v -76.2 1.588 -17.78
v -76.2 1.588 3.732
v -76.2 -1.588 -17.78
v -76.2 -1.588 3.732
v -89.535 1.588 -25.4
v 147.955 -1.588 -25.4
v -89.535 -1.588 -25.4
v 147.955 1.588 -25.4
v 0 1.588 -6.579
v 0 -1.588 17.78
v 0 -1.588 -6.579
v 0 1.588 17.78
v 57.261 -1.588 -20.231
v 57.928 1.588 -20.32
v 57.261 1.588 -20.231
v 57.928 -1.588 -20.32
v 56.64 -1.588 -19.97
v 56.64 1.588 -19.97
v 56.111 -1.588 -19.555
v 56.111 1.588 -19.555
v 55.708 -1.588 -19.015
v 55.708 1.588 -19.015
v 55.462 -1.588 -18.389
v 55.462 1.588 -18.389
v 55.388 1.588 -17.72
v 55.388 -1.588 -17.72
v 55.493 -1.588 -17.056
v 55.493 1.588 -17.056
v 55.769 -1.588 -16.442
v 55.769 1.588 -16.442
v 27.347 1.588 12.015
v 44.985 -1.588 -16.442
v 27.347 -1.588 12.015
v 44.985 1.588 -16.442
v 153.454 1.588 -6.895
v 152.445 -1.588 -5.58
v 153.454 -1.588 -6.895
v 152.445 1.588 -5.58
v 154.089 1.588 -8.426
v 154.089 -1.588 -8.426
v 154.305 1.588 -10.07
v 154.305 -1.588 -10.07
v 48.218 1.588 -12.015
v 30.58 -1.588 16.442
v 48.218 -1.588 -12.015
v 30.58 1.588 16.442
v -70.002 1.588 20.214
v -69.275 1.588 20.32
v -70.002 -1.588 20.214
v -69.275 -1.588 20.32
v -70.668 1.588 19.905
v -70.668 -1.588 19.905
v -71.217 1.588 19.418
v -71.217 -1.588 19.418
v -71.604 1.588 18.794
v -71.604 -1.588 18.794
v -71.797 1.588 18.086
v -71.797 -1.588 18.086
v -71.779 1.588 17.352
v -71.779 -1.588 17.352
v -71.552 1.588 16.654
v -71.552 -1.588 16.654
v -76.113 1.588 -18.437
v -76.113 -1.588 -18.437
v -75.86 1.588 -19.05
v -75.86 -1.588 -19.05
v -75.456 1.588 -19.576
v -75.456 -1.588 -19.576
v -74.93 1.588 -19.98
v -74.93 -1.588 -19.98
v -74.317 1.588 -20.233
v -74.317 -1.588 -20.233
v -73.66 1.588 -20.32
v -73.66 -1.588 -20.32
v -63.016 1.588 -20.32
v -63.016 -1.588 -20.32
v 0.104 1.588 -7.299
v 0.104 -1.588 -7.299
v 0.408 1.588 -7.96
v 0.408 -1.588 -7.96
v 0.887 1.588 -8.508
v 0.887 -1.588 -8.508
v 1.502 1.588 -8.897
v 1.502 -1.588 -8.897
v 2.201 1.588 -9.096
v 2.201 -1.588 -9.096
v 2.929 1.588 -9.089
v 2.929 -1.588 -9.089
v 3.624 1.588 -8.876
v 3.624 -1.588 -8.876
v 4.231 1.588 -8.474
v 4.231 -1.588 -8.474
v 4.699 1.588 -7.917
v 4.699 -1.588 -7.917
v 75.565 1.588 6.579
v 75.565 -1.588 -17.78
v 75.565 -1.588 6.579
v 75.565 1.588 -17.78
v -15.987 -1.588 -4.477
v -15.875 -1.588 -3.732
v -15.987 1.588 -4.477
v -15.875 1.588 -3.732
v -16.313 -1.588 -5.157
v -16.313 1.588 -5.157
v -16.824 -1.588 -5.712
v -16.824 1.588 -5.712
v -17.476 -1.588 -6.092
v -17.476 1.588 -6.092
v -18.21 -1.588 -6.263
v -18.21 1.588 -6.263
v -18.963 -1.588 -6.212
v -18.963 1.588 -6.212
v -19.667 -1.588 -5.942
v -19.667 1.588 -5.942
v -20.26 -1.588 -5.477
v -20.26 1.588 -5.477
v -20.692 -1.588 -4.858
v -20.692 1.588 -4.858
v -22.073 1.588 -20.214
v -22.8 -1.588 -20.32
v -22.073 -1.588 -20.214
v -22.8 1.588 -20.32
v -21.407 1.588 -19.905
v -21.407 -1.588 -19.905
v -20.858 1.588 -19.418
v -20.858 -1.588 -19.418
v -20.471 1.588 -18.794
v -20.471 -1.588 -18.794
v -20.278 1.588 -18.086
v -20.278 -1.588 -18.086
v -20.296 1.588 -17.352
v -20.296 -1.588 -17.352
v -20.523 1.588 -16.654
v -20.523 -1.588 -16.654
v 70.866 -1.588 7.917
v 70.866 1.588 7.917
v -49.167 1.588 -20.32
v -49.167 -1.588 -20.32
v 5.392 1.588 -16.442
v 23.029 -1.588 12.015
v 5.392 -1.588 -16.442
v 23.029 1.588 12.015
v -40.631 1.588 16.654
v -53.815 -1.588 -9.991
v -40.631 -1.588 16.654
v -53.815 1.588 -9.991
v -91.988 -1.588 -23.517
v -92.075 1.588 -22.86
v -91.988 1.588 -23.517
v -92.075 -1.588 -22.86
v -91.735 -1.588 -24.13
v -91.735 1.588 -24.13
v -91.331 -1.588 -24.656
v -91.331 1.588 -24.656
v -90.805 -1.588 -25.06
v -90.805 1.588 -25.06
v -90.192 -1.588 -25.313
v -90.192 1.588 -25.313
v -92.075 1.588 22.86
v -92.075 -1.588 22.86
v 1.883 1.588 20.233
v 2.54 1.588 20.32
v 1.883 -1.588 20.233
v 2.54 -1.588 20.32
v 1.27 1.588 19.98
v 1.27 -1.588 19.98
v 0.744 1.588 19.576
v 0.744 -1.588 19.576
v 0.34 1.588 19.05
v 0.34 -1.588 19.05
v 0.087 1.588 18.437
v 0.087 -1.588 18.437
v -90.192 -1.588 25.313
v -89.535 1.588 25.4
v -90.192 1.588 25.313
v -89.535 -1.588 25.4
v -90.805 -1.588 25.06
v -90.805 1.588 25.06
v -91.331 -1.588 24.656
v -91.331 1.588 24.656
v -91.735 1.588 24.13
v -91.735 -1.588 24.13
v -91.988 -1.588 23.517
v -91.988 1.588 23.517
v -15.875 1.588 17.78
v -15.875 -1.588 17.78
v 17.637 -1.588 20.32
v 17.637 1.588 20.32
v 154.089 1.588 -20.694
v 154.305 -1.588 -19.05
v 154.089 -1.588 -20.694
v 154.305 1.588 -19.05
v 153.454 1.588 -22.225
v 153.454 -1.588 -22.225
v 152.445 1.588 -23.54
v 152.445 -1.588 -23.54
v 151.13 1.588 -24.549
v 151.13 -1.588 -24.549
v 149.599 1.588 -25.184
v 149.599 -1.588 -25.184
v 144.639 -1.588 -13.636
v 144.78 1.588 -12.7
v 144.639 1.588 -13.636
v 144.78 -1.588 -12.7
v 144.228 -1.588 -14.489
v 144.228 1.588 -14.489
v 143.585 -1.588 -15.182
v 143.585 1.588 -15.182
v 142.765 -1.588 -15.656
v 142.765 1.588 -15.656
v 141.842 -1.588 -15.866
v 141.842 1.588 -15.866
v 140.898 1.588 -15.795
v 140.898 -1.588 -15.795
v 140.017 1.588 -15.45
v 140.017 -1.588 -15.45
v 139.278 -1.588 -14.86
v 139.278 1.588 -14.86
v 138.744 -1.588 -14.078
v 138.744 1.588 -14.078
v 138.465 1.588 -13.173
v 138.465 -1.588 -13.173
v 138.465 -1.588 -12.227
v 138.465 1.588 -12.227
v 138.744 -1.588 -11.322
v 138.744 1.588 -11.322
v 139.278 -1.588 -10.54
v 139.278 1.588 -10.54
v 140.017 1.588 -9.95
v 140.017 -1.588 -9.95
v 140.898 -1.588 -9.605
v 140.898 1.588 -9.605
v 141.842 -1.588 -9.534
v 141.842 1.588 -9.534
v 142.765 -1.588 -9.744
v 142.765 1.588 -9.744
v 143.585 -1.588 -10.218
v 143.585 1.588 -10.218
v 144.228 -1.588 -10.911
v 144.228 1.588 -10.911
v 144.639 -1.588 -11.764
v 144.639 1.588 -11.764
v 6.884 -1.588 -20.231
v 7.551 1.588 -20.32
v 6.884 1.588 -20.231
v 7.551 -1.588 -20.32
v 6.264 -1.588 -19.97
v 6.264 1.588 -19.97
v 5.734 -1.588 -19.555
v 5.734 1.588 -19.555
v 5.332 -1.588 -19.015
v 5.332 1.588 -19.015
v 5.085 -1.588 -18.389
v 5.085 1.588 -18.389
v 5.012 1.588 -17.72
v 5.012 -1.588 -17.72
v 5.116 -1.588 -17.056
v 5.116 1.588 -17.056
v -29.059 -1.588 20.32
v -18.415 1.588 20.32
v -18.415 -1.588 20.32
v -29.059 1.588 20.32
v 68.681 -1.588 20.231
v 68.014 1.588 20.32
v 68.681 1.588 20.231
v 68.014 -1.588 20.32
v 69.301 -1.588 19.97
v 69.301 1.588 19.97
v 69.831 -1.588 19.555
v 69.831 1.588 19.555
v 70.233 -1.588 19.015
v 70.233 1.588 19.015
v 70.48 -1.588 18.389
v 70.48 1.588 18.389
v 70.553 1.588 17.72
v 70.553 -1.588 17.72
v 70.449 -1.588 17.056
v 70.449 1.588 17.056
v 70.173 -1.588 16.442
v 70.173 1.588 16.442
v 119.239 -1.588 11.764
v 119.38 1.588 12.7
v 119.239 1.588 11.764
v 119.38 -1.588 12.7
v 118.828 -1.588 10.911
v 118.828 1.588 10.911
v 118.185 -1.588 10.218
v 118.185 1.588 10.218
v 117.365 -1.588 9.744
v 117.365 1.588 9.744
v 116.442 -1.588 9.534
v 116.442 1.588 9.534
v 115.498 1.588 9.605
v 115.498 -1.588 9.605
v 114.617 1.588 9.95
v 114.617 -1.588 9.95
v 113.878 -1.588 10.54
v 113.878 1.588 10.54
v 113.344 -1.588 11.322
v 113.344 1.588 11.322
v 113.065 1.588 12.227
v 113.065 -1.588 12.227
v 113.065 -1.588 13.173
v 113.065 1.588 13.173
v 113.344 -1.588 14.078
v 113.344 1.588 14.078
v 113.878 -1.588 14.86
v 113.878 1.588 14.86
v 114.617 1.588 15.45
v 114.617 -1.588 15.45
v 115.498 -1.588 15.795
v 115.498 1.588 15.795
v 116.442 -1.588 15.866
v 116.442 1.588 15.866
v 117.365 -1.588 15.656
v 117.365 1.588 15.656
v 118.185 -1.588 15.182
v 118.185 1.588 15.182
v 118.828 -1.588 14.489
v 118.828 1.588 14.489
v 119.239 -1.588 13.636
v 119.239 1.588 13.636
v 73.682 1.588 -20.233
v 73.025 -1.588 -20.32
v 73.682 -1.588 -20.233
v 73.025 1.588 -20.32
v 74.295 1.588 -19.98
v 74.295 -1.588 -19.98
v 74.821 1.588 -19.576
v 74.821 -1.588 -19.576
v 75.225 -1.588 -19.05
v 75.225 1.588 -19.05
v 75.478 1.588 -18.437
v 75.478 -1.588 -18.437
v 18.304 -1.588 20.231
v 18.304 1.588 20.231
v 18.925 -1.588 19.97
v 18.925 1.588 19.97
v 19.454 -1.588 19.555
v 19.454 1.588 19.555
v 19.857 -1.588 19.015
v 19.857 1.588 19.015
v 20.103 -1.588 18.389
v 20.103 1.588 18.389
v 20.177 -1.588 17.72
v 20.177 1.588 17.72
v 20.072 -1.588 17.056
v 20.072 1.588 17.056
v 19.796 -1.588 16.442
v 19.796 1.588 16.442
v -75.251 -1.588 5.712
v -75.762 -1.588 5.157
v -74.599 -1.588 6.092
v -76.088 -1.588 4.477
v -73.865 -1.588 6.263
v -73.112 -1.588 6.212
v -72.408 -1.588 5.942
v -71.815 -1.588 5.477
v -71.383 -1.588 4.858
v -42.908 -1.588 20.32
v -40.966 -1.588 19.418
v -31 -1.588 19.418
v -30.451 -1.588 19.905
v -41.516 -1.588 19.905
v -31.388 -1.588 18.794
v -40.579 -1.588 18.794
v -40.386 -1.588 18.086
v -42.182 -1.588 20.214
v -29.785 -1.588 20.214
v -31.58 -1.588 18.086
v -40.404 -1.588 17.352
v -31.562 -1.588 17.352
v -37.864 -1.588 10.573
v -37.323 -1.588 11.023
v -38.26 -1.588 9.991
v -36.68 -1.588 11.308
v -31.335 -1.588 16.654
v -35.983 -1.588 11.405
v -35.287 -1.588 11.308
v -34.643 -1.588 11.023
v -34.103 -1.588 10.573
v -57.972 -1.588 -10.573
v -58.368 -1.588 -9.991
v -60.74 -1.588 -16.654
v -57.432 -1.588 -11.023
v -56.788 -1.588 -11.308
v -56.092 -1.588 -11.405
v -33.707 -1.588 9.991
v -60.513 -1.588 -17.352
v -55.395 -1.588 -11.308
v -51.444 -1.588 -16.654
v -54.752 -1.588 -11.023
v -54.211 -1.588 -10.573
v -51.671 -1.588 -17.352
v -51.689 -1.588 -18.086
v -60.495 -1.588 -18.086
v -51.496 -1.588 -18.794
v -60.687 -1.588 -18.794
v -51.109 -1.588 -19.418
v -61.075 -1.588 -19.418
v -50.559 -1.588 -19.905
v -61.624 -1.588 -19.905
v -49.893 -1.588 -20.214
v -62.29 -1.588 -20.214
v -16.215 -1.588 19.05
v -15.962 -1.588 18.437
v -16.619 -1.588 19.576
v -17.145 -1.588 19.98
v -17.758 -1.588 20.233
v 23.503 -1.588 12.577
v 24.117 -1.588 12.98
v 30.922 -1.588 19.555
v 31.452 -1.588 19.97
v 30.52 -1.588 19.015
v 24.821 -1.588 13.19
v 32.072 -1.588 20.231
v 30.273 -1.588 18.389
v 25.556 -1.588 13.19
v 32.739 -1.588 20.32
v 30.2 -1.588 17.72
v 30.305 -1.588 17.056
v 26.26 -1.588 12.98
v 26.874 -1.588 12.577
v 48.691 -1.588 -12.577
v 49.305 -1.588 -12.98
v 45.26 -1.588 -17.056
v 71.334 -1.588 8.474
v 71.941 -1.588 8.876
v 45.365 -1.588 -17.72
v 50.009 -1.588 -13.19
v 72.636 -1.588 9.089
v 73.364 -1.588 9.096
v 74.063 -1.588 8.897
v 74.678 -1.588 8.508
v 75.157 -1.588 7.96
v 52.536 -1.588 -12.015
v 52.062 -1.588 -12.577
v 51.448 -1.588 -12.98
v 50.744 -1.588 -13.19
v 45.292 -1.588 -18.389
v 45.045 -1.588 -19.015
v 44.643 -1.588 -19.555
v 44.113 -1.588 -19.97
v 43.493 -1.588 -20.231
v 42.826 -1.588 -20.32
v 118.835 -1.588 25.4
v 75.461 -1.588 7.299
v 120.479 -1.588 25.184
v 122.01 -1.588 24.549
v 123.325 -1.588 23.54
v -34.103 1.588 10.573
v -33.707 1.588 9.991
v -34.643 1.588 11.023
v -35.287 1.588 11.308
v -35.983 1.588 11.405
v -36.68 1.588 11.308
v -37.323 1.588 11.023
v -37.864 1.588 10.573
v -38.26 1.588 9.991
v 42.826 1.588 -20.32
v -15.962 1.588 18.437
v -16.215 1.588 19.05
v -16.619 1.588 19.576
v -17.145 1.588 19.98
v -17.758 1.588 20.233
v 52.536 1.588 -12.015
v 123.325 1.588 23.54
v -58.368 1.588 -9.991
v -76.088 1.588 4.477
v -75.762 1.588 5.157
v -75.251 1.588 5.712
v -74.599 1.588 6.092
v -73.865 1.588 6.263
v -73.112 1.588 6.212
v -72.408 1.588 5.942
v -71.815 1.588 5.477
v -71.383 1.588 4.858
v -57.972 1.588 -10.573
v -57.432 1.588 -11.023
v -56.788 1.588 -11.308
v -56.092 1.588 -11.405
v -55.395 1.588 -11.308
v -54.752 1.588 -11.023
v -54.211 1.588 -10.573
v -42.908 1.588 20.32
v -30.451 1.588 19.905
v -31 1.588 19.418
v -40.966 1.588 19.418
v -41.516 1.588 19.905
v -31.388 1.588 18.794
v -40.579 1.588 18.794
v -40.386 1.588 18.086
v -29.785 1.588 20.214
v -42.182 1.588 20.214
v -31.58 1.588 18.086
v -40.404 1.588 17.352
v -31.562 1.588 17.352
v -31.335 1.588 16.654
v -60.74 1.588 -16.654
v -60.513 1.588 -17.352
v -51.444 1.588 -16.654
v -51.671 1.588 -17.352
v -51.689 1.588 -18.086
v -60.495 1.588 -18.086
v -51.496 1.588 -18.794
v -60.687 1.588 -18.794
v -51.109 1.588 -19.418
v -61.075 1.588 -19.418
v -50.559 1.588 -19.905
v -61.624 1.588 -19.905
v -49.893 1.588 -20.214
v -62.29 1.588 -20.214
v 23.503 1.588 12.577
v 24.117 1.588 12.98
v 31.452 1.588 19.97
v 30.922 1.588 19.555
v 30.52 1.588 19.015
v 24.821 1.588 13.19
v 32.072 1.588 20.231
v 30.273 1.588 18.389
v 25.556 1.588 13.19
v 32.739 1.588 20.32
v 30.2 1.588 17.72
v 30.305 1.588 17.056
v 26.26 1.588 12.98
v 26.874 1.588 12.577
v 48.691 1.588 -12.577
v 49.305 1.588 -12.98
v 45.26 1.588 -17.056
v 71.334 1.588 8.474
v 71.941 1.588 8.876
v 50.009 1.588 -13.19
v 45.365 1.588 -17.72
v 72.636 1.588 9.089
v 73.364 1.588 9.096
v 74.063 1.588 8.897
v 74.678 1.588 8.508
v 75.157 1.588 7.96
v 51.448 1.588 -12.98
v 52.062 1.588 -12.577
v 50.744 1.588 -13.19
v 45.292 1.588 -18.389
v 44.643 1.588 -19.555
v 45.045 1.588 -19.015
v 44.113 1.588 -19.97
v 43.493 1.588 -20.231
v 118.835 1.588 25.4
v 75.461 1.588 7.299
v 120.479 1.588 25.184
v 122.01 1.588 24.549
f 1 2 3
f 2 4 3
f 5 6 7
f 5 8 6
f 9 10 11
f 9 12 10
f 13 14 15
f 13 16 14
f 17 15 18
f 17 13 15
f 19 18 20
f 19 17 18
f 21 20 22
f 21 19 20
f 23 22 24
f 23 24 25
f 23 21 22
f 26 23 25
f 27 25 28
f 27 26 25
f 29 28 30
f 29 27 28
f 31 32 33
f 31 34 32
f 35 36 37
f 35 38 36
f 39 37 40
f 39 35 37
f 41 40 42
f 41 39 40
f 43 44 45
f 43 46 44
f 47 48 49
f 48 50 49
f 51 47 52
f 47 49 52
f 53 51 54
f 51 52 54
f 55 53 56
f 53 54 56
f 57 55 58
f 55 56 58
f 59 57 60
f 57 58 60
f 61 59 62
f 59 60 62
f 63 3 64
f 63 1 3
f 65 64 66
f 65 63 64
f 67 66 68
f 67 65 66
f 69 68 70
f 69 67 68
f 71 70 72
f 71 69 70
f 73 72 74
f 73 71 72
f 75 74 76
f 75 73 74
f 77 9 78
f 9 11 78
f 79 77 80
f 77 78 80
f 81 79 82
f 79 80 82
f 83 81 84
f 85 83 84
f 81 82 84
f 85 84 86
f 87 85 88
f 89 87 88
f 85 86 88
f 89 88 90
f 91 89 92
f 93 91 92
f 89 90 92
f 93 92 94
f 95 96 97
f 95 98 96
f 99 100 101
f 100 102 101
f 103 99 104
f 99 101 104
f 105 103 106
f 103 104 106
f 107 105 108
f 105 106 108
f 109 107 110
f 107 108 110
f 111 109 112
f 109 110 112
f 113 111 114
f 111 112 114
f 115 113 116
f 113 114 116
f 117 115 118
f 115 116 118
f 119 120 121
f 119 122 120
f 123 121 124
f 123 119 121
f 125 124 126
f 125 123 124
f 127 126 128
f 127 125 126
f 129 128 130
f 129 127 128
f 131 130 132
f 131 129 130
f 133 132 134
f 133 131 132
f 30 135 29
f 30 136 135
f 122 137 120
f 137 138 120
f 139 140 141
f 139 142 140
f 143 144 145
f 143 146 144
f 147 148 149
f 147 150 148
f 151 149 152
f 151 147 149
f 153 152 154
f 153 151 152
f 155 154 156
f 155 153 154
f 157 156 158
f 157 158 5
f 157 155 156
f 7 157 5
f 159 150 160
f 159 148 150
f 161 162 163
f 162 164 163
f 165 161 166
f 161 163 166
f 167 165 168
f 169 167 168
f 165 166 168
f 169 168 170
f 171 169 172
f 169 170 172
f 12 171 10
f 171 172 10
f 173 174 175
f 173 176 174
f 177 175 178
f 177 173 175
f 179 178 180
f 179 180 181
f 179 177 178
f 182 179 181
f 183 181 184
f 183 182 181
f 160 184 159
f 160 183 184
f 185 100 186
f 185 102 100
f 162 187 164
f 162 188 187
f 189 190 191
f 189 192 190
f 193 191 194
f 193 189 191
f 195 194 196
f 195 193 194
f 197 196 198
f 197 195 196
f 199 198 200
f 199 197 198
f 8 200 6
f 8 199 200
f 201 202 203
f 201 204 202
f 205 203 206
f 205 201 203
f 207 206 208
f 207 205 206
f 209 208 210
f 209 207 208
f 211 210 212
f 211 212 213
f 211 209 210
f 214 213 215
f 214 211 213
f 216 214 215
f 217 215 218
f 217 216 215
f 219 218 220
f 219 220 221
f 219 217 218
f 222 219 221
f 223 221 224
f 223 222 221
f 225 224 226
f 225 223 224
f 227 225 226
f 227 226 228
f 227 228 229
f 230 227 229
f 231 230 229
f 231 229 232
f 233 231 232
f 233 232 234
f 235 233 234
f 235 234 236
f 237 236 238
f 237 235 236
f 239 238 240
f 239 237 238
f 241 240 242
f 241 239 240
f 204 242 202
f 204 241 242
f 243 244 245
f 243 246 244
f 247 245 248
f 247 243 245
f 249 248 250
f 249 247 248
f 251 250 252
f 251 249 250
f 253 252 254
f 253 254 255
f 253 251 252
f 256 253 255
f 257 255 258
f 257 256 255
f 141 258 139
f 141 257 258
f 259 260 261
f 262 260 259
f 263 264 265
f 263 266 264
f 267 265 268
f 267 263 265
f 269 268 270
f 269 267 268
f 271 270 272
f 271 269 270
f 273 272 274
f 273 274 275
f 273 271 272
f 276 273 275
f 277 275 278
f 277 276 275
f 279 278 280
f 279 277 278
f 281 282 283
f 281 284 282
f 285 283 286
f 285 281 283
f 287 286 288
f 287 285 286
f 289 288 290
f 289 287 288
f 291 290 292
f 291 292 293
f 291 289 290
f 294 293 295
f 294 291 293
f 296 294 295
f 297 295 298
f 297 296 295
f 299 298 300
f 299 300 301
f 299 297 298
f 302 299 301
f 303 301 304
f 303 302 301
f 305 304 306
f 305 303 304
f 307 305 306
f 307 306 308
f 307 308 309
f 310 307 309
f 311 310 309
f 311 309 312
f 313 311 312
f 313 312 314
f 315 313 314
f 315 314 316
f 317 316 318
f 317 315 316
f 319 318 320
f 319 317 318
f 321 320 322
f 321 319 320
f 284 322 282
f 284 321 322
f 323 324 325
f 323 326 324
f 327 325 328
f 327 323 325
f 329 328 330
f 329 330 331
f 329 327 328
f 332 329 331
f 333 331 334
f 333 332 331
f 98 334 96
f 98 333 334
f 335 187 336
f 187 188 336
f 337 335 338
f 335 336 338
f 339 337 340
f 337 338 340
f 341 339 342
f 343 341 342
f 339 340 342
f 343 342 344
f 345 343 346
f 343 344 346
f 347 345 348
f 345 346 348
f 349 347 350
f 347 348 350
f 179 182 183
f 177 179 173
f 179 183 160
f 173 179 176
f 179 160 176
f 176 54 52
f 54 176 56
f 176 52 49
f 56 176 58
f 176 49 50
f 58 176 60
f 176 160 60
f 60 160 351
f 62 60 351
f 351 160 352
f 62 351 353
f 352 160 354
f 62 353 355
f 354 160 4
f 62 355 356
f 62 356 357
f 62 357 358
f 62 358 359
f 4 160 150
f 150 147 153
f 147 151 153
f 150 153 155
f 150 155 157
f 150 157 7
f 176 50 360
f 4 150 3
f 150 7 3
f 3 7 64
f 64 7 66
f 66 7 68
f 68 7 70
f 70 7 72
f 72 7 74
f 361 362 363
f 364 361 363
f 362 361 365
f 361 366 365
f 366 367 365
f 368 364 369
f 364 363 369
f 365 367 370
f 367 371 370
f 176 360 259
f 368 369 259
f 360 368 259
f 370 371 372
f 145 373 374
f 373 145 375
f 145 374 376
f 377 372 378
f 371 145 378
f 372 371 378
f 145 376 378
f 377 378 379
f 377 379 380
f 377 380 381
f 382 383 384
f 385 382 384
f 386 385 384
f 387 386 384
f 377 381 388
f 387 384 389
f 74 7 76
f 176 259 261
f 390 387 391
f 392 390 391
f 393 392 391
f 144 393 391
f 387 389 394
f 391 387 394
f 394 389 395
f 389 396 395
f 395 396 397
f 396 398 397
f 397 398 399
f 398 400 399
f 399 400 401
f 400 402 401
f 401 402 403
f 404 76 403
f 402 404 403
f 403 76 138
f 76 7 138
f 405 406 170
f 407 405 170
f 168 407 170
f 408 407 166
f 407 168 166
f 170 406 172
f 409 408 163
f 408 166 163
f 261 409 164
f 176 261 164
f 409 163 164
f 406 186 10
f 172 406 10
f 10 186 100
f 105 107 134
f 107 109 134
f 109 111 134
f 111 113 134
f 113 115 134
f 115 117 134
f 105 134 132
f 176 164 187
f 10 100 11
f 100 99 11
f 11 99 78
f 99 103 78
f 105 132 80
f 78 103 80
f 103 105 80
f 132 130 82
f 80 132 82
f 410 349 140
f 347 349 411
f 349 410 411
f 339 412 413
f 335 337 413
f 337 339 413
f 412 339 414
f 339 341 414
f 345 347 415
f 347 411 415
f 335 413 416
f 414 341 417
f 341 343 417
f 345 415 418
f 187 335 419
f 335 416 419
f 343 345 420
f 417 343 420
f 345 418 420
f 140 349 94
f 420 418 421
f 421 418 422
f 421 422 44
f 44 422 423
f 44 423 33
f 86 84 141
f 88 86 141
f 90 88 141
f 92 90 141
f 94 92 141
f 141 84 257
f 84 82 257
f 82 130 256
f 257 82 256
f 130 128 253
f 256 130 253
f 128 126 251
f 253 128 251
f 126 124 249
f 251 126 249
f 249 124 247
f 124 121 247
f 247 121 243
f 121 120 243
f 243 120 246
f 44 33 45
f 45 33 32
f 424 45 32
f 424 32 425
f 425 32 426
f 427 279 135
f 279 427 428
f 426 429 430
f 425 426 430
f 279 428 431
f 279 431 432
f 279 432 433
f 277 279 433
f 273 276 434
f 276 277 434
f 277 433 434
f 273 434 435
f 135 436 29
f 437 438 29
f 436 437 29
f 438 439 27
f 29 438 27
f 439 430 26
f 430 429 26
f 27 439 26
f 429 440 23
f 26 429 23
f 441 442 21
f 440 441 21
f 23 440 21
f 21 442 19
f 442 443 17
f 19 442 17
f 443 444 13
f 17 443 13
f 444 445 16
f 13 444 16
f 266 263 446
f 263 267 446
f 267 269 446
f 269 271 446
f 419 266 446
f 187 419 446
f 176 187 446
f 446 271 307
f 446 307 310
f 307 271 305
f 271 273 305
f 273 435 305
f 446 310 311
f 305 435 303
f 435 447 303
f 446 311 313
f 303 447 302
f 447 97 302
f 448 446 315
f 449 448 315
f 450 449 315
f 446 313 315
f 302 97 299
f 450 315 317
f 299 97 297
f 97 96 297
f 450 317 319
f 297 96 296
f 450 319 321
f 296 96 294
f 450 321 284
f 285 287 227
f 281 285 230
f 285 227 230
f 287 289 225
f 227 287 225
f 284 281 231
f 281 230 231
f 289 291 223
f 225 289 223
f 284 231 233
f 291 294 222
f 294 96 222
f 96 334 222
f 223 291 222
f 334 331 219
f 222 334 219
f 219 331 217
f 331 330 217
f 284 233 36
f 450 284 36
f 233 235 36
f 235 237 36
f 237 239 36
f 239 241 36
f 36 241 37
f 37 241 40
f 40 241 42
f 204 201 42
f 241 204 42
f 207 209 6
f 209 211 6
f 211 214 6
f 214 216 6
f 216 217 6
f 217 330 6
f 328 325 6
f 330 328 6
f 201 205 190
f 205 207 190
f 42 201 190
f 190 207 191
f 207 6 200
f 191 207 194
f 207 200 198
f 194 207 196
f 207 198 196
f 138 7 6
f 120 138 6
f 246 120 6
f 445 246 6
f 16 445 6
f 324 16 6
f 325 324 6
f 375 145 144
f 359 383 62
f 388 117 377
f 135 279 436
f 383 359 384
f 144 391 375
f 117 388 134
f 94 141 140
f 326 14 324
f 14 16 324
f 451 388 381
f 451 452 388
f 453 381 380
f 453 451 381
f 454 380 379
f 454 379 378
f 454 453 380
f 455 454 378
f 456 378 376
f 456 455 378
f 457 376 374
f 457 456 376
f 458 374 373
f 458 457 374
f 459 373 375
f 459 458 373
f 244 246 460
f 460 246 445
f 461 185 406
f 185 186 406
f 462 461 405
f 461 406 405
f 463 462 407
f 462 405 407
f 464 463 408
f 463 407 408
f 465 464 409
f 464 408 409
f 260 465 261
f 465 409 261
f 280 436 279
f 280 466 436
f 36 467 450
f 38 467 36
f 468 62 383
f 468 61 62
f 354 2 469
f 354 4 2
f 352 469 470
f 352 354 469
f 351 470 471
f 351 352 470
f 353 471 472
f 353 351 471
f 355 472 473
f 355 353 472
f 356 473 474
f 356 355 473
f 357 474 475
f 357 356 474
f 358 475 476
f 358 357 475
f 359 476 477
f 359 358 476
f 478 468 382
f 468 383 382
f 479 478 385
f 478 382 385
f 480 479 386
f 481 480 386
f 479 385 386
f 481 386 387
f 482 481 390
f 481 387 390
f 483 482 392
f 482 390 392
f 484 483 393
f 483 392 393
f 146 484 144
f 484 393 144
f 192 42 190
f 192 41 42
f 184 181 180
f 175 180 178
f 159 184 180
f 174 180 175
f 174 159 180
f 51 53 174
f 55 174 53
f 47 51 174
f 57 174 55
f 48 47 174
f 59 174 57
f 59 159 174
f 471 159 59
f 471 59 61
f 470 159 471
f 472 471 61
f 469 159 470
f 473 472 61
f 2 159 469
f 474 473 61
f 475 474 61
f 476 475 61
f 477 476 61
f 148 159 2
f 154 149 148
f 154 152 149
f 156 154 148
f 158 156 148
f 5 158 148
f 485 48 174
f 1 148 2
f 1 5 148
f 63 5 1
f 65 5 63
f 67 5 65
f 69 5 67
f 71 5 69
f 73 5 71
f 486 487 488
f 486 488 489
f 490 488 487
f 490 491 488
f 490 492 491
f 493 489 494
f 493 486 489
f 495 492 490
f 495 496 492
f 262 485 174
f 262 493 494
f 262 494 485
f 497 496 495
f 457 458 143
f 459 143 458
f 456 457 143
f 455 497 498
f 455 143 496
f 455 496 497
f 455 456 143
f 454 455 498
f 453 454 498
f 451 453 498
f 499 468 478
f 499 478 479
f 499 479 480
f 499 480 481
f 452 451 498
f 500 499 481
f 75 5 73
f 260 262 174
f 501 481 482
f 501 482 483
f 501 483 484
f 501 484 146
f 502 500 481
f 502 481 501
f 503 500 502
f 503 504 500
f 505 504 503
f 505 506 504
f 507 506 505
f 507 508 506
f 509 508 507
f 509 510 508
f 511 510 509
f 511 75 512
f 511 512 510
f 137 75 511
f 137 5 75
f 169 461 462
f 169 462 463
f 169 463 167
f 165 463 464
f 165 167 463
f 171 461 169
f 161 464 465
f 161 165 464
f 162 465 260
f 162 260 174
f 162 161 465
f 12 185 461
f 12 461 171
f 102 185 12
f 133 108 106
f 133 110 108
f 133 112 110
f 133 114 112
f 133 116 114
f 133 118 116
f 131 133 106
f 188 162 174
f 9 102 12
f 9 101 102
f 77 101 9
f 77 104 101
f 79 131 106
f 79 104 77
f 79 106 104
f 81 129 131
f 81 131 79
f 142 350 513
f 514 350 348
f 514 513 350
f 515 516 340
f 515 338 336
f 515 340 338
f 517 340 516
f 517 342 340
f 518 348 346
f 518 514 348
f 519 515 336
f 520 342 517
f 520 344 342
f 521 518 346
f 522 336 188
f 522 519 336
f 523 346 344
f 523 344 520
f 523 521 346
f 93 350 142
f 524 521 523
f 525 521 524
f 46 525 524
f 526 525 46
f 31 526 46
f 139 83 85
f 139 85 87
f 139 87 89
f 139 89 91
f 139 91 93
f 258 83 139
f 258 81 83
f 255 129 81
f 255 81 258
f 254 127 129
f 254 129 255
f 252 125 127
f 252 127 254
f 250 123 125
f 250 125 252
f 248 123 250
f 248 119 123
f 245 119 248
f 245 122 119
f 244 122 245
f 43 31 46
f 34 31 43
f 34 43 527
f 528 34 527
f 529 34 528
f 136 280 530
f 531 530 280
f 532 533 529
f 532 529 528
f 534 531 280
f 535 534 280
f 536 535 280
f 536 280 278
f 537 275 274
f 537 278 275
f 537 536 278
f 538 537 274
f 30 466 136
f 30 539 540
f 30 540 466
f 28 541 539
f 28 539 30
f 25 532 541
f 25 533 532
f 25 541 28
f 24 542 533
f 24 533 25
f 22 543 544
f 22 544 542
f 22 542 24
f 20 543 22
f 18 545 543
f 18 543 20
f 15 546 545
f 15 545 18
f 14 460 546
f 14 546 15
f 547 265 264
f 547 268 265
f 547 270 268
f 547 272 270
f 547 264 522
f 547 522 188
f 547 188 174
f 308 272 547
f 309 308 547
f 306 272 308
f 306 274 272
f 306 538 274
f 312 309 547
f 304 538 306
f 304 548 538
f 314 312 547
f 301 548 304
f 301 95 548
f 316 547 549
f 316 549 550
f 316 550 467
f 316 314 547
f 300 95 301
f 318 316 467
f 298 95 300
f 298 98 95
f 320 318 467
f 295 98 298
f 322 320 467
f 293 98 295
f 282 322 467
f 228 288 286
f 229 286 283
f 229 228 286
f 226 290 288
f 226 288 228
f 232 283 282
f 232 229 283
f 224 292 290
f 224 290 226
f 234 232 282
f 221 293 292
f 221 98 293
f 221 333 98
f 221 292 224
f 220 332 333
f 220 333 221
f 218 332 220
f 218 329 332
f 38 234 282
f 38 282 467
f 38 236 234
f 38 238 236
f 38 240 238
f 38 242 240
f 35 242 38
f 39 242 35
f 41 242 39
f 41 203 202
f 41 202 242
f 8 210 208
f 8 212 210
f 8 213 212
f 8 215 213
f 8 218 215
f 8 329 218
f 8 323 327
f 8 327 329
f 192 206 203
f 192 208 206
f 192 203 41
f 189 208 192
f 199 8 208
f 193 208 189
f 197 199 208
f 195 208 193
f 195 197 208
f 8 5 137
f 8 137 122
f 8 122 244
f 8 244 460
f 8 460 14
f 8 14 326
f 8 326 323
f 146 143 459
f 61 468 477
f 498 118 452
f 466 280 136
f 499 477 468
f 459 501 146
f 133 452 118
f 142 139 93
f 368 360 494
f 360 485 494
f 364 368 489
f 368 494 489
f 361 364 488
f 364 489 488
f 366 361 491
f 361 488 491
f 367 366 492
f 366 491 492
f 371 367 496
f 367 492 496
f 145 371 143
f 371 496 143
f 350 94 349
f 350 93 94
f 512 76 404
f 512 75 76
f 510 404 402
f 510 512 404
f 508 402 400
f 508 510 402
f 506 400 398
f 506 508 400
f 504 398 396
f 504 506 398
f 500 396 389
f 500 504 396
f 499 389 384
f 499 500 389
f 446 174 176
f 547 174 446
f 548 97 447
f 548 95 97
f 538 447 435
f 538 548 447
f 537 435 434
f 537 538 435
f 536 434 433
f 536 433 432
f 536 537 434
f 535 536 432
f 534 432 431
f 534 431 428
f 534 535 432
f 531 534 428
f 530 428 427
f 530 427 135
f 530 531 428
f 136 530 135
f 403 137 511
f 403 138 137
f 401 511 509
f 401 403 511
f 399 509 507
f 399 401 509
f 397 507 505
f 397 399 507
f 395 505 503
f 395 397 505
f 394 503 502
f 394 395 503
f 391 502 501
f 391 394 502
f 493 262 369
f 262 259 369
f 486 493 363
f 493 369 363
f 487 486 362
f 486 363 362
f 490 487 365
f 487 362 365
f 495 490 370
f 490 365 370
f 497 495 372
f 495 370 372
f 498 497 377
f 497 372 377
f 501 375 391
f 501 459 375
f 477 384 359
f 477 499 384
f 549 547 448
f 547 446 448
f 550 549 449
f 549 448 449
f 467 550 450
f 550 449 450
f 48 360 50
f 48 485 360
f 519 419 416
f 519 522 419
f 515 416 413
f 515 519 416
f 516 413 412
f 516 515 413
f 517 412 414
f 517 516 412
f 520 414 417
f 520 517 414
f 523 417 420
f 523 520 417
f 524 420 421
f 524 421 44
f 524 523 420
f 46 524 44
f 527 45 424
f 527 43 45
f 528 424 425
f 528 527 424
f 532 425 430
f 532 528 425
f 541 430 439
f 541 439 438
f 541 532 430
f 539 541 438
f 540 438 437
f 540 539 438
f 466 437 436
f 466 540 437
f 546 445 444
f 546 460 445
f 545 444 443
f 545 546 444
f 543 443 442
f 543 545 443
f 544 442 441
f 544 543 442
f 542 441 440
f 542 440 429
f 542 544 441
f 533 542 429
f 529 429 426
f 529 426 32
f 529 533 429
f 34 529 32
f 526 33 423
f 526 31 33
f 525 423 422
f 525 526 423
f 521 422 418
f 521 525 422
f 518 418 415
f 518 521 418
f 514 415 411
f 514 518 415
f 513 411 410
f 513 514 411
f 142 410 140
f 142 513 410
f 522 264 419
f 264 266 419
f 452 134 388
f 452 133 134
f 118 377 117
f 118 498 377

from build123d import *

# Parameters (mm, degrees)
SKETCH1_R           = 3.175
BOSS_EXTRUDE1_DEPTH = 1.5875
FILLET1_R           = 2.54
FILLET2_R           = 6.35


with BuildPart() as part:
    # Sketch1 → Boss-Extrude1 (new body, symmetric)
    with BuildSketch(Plane(origin=(0, 0, 0), x_dir=(1, 0, 0), z_dir=(0, 1, 0))):
        Polygon((121.465512242, -25.4), (154.305, 7.439487758), (154.305, 25.4), (-92.075, 25.4), (-92.075, -25.4), align=None)
        Polygon((-38.817248104, -20.32), (-73.366085229, -20.32), (-56.091666667, 14.592509095), align=None, mode=Mode.SUBTRACT)
        Polygon((-15.875, 14.592509095), (-15.875, -20.32), (-33.149418563, -20.32), align=None, mode=Mode.SUBTRACT)
        Polygon((22.200034711, -20.32), (0, -20.32), (0, 15.498543399), align=None, mode=Mode.SUBTRACT)
        with Locations((116.205, -12.7)):
            Circle(SKETCH1_R, mode=Mode.SUBTRACT)
        Polygon((72.576701378, -20.32), (28.176631956, -20.32), (50.376666667, 15.498543399), align=None, mode=Mode.SUBTRACT)
        Polygon((53.364965289, 20.32), (75.565, 20.32), (75.565, -15.498543399), align=None, mode=Mode.SUBTRACT)
        Polygon((-76.2, -14.592509095), (-76.2, 20.32), (-58.925581437, 20.32), align=None, mode=Mode.SUBTRACT)
        Polygon((-53.257751896, 20.32), (-18.708914771, 20.32), (-35.983333333, -14.592509095), align=None, mode=Mode.SUBTRACT)
        Polygon((2.988298622, 20.32), (47.388368044, 20.32), (25.188333333, -15.498543399), align=None, mode=Mode.SUBTRACT)
        with Locations((141.605, 12.7)):
            Circle(SKETCH1_R, mode=Mode.SUBTRACT)
    extrude(amount=BOSS_EXTRUDE1_DEPTH, both=True)

    # Fillet1
    fillet1_edges = [part.edges().sort_by_distance(p)[0] for p in [
        (-76.2, 0, -20.32),
        (-76.2, 0, 14.592509095),
        (-58.925581437, 0, -20.32),
        (2.988298622, 0, -20.32),
        (25.188333333, 0, 15.498543399),
        (47.388368044, 0, -20.32),
        (0, 0, -15.498543399),
        (0, 0, 20.32),
        (22.200034711, 0, 20.32),
        (72.576701378, 0, 20.32),
        (50.376666667, 0, -15.498543399),
        (28.176631956, 0, 20.32),
        (75.565, 0, 15.498543399),
        (75.565, 0, -20.32),
        (53.364965289, 0, -20.32),
        (-15.875, 0, 20.32),
        (-15.875, 0, -14.592509095),
        (-33.149418563, 0, 20.32),
        (-35.983333333, 0, 14.592509095),
        (-18.708914771, 0, -20.32),
        (-53.257751896, 0, -20.32),
        (-92.075, 0, 25.4),
        (-92.075, 0, -25.4),
        (-38.817248104, 0, 20.32),
        (-56.091666667, 0, -14.592509095),
        (-73.366085229, 0, 20.32),
    ]]
    fillet(fillet1_edges, radius=FILLET1_R)

    # Fillet2
    fillet2_edges = [part.edges().sort_by_distance(p)[0] for p in [
        (154.305, 0, -25.4),
        (154.305, 0, -7.439487758),
        (121.465512242, 0, 25.4),
    ]]
    fillet(fillet2_edges, radius=FILLET2_R)


solid = part.part
